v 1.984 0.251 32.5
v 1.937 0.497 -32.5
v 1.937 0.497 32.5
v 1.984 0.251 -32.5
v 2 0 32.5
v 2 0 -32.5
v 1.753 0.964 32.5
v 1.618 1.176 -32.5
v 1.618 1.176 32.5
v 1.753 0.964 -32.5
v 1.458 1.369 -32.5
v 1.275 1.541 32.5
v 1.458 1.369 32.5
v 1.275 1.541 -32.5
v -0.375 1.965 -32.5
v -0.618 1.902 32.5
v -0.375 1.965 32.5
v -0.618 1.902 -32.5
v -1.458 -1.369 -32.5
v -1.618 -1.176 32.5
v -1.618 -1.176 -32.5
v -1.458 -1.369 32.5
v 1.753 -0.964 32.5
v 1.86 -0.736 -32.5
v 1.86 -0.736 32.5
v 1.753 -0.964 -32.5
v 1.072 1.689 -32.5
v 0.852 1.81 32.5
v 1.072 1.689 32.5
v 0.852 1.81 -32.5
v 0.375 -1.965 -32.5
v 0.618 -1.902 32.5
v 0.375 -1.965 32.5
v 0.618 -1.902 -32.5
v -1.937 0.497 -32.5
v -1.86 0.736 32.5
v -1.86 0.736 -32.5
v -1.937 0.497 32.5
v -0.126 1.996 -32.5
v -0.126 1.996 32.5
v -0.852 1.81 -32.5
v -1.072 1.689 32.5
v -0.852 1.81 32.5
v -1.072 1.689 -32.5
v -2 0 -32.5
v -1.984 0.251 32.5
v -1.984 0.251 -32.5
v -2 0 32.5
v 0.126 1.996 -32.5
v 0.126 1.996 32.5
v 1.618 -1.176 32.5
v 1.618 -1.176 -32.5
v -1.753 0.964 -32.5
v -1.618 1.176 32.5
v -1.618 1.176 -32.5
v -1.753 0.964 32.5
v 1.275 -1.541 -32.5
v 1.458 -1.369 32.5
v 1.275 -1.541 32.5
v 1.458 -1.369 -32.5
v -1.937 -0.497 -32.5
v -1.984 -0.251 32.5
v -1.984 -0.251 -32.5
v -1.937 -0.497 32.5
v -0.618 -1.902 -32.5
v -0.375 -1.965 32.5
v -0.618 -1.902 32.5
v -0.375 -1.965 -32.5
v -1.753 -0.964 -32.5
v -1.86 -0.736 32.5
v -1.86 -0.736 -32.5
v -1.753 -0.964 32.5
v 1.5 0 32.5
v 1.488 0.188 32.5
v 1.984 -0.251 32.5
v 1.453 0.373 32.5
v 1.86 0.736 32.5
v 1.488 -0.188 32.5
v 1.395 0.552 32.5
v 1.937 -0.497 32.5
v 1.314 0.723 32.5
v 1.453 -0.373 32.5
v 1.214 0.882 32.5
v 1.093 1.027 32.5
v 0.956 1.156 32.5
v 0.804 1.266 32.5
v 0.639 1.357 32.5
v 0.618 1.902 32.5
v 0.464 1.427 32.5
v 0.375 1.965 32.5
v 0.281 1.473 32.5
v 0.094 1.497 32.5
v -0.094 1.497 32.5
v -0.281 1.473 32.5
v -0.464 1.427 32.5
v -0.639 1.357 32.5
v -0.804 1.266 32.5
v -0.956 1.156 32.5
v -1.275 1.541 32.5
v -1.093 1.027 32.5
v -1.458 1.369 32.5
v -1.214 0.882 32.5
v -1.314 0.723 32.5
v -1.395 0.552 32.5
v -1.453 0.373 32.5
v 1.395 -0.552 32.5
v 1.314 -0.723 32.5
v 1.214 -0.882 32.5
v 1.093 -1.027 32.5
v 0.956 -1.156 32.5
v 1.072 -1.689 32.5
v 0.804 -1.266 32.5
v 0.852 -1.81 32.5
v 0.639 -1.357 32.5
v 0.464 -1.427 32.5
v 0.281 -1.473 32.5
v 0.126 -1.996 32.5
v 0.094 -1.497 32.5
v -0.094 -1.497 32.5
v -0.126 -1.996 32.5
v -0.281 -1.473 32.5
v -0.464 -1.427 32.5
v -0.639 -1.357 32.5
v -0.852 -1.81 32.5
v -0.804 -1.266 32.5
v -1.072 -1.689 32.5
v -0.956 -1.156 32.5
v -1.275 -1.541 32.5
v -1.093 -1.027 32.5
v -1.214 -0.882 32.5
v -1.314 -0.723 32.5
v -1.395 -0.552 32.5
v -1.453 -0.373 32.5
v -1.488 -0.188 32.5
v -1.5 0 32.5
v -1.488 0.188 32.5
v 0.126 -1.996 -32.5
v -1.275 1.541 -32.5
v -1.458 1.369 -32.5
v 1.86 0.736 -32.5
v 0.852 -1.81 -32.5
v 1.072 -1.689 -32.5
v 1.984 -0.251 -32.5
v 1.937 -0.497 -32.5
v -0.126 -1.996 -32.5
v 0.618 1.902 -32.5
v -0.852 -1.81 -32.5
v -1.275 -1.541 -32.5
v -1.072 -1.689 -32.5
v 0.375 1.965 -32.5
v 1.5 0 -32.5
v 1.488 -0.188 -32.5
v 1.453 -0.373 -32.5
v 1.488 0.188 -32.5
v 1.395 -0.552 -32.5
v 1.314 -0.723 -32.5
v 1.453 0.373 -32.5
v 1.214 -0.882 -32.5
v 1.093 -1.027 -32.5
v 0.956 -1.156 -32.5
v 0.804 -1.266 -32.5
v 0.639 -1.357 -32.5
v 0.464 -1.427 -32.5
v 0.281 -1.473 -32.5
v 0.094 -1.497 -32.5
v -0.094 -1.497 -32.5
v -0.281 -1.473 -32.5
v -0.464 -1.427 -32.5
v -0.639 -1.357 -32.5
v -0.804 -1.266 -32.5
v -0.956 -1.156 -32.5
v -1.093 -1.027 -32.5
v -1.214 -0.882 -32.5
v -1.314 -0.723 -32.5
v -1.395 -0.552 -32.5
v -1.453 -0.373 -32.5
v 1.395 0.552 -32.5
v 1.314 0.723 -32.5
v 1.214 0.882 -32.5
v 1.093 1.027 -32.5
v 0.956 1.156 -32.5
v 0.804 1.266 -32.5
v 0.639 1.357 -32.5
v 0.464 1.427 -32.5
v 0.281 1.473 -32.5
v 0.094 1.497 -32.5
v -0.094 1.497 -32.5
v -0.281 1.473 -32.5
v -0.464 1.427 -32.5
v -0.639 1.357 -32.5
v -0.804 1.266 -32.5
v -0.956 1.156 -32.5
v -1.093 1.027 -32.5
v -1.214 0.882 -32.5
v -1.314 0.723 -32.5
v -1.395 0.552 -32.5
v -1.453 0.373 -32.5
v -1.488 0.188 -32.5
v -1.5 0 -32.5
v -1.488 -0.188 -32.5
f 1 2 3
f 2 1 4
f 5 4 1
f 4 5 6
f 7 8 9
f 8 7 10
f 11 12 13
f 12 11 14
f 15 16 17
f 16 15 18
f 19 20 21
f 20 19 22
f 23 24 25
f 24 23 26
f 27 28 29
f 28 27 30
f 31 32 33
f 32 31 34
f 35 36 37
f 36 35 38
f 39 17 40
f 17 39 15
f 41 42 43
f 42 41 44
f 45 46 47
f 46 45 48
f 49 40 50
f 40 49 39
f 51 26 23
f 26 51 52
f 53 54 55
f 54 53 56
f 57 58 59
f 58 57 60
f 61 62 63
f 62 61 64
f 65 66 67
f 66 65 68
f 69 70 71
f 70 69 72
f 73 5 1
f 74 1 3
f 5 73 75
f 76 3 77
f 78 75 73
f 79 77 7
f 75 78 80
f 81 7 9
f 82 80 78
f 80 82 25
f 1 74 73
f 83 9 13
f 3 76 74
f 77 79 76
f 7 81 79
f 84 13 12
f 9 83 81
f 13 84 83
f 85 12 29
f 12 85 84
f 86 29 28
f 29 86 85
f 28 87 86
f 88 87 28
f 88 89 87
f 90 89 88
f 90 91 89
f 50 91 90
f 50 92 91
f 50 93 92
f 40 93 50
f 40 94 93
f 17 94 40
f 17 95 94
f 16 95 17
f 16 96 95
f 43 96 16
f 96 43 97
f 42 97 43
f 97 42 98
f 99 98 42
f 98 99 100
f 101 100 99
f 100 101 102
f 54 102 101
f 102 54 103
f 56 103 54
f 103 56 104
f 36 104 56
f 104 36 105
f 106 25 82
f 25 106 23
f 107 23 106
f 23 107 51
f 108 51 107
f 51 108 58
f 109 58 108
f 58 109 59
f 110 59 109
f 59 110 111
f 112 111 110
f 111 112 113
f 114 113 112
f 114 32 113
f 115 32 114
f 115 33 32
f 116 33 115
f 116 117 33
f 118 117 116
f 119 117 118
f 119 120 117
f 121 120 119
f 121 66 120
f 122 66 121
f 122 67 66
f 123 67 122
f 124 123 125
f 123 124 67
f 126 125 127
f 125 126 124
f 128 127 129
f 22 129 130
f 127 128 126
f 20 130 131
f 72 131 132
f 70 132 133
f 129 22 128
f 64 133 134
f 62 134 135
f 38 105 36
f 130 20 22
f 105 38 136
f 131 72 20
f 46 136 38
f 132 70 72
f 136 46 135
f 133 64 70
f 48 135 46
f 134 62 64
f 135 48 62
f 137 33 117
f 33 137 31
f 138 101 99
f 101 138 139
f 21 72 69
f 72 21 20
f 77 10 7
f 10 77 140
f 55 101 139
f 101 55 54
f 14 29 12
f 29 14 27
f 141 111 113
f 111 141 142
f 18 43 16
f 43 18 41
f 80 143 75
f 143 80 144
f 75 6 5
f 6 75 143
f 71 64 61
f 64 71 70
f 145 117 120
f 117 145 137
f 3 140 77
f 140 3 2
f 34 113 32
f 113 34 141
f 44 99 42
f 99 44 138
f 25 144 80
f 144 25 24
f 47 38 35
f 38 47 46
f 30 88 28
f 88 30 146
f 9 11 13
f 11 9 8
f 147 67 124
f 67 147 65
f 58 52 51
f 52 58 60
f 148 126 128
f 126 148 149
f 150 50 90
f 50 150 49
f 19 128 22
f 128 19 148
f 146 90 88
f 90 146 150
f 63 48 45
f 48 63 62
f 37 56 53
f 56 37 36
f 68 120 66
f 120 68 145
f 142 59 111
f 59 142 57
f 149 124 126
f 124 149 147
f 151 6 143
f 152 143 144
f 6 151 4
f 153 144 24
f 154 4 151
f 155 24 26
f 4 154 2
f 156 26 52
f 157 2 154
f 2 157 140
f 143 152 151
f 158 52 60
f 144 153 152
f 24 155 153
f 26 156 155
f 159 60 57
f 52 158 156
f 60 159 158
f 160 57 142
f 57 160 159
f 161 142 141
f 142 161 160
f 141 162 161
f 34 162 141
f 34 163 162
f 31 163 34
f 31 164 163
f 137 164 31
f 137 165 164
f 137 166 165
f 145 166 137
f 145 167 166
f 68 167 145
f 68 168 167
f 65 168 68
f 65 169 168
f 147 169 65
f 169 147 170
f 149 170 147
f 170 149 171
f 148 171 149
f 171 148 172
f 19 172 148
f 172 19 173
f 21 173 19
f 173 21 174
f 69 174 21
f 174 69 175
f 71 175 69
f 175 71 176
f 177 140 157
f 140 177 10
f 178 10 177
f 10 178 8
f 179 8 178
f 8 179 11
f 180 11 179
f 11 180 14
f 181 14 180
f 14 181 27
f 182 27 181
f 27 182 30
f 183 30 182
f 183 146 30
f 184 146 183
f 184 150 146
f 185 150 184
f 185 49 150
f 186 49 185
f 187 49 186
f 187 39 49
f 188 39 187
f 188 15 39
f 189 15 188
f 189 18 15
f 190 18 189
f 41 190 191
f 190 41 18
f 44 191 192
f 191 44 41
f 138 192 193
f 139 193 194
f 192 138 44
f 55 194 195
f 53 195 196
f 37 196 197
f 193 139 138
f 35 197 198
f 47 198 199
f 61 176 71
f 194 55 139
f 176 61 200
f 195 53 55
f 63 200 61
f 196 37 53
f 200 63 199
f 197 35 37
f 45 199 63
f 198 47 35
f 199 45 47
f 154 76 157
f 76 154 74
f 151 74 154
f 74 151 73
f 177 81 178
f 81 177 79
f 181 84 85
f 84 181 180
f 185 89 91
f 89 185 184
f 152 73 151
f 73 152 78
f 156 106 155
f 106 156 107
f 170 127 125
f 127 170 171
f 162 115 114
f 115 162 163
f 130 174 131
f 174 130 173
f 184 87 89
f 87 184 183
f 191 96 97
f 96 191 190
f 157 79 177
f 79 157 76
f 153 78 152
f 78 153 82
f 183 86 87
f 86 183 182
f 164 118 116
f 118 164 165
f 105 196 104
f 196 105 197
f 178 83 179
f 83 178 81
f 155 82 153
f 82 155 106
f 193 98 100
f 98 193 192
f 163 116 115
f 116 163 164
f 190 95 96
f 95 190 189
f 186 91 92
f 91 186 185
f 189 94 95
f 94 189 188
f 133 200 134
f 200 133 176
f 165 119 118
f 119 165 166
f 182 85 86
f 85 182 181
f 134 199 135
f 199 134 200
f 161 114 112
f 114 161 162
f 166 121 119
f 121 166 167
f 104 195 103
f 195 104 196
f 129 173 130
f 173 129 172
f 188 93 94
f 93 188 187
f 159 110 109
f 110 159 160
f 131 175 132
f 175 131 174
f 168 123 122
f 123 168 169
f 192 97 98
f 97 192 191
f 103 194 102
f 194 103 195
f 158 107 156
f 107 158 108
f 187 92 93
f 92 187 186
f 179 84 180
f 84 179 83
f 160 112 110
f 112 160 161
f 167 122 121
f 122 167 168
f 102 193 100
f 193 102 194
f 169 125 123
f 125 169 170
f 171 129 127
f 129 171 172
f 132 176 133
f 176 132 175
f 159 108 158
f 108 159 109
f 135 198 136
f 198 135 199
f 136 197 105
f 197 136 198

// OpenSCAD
$fn = 50;


difference() {
	union() {
		translate(v = [0, 0, -32.5000000000]) {
			cylinder(h = 65, r = 2.0000000000);
		}
	}
	union() {
		translate(v = [0, 0, -100.0000000000]) {
			cylinder(h = 200, r = 1.5000000000);
		}
	}
}
